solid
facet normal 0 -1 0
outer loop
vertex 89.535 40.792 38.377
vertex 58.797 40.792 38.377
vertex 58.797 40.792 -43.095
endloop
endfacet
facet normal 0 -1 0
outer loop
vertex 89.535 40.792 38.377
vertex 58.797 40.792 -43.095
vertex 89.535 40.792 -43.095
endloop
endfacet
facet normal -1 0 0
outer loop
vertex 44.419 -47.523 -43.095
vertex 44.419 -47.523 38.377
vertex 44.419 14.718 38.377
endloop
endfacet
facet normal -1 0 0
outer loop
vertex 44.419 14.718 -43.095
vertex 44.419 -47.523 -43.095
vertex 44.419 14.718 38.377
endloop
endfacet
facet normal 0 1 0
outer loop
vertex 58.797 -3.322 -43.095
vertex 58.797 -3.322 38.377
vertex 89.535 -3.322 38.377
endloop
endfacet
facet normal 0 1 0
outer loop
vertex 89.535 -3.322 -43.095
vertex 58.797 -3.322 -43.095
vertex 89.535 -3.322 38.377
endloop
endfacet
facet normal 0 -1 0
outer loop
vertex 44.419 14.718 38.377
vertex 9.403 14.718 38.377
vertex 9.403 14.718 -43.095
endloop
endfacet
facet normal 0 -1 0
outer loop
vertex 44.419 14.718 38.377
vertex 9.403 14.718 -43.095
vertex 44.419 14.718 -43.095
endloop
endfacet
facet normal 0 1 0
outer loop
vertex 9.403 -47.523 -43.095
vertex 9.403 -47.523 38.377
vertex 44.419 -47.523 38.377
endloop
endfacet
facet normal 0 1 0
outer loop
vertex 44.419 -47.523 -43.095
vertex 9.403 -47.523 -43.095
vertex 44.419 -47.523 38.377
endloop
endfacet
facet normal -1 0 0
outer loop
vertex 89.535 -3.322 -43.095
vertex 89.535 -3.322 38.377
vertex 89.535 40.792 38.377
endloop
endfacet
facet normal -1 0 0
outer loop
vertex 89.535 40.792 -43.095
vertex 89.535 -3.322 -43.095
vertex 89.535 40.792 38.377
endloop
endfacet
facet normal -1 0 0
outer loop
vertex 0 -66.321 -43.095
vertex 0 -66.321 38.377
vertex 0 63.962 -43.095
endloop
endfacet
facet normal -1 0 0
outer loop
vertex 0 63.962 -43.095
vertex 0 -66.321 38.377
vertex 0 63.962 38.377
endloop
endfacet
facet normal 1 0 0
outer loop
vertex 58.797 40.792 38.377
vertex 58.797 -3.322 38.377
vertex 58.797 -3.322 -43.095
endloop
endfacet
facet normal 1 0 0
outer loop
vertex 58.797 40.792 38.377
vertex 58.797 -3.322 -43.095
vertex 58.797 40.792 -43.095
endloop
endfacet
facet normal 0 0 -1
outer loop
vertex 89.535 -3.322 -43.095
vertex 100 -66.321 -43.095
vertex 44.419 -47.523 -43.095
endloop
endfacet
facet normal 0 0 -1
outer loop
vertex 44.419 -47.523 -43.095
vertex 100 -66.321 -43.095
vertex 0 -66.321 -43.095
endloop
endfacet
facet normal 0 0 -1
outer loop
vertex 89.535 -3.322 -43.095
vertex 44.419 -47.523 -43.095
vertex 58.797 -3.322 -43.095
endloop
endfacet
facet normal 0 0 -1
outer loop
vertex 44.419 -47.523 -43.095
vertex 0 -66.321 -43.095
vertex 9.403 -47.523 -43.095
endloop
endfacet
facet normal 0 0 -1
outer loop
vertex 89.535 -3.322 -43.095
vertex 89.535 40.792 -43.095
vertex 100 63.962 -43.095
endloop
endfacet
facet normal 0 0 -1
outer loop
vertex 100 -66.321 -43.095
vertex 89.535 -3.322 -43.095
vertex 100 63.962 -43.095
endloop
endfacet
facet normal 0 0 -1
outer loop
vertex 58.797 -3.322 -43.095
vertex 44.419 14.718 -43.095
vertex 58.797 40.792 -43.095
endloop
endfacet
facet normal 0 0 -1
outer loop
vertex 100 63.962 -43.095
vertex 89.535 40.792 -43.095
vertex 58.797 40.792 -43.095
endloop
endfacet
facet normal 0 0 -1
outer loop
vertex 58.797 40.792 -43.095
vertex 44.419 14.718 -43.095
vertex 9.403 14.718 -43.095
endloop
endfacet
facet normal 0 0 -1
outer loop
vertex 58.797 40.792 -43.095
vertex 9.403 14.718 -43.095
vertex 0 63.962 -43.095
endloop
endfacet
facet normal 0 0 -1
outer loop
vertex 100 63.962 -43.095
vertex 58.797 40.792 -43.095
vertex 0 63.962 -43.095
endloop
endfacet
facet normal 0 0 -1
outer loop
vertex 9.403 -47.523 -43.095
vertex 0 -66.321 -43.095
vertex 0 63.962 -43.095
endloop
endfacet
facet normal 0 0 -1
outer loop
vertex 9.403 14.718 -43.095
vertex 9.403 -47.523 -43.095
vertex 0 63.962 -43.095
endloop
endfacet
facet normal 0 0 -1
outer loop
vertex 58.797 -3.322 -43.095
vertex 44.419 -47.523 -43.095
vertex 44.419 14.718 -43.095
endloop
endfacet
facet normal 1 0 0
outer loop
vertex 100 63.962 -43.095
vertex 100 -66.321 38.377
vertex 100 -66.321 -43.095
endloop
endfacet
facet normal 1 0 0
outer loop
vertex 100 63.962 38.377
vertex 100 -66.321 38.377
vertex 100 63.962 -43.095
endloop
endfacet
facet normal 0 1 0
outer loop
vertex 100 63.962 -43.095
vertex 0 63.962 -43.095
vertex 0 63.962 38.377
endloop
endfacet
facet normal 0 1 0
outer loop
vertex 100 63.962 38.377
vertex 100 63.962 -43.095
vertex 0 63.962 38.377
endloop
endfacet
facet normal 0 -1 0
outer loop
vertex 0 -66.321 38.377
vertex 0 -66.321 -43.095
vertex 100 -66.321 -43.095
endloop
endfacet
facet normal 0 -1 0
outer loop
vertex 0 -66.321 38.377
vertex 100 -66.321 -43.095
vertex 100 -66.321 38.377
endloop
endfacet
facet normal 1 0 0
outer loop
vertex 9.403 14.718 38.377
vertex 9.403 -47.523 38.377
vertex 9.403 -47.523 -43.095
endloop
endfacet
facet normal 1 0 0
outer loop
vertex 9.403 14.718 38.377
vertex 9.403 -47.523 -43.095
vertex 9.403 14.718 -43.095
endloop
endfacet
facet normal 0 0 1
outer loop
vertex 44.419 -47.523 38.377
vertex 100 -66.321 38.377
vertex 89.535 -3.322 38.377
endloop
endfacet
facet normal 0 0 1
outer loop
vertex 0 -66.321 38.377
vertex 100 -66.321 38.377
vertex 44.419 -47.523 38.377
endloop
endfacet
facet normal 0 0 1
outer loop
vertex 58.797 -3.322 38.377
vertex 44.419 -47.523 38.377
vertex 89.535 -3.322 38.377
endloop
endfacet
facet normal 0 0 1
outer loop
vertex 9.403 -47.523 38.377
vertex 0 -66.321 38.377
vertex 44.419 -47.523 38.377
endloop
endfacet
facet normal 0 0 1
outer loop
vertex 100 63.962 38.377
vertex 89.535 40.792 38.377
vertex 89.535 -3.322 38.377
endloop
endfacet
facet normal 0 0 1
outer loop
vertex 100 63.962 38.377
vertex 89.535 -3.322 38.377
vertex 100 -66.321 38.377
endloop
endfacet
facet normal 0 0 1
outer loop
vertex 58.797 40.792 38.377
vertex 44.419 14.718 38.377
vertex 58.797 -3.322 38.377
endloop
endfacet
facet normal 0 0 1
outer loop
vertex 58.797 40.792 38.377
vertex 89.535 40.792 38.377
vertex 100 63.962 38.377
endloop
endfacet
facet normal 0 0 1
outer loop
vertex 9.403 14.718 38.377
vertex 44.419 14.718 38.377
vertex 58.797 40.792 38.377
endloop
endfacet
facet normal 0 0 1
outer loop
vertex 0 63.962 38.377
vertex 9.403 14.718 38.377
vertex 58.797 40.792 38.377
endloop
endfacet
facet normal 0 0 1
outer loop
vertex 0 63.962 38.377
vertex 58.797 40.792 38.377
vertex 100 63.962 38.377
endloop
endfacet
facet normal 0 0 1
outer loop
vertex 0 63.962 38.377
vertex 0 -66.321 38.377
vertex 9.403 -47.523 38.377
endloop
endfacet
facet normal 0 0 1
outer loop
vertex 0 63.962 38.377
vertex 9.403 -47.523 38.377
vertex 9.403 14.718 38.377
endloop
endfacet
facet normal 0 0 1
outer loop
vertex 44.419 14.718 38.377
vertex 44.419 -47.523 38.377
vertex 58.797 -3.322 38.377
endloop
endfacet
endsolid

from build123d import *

# Parameters (mm, degrees)
F0_W     = 130.282268
F0_H     = 81.471775
F1_DEPTH = 100
F2_W     = 35.016233
F2_H     = 62.241167
F3_DEPTH = 100
F2_W_2   = 30.737754
F2_H_2   = 44.113887
F4_DEPTH = 100


with BuildPart() as f1:
    # F0 (on Right) → F1 (new body)
    with BuildSketch(Plane.YZ):
        with Locations((-1.179434, -2.358871)):
            Rectangle(F0_W, F0_H)
    extrude(amount=F1_DEPTH)

    # F2 (on face) → F3 (cut)
    with BuildSketch(Plane.XY.offset(38.377017)):
        with Locations((26.910903, -16.402766)):
            Rectangle(F2_W, F2_H)
    extrude(amount=-F3_DEPTH, mode=Mode.SUBTRACT)

    # F2 (on face) → F4 (cut)
    with BuildSketch(Plane.XY.offset(38.377017)):
        with Locations((74.166195, 18.735057)):
            Rectangle(F2_W_2, F2_H_2)
    extrude(amount=-F4_DEPTH, mode=Mode.SUBTRACT)


solid = f1.part
